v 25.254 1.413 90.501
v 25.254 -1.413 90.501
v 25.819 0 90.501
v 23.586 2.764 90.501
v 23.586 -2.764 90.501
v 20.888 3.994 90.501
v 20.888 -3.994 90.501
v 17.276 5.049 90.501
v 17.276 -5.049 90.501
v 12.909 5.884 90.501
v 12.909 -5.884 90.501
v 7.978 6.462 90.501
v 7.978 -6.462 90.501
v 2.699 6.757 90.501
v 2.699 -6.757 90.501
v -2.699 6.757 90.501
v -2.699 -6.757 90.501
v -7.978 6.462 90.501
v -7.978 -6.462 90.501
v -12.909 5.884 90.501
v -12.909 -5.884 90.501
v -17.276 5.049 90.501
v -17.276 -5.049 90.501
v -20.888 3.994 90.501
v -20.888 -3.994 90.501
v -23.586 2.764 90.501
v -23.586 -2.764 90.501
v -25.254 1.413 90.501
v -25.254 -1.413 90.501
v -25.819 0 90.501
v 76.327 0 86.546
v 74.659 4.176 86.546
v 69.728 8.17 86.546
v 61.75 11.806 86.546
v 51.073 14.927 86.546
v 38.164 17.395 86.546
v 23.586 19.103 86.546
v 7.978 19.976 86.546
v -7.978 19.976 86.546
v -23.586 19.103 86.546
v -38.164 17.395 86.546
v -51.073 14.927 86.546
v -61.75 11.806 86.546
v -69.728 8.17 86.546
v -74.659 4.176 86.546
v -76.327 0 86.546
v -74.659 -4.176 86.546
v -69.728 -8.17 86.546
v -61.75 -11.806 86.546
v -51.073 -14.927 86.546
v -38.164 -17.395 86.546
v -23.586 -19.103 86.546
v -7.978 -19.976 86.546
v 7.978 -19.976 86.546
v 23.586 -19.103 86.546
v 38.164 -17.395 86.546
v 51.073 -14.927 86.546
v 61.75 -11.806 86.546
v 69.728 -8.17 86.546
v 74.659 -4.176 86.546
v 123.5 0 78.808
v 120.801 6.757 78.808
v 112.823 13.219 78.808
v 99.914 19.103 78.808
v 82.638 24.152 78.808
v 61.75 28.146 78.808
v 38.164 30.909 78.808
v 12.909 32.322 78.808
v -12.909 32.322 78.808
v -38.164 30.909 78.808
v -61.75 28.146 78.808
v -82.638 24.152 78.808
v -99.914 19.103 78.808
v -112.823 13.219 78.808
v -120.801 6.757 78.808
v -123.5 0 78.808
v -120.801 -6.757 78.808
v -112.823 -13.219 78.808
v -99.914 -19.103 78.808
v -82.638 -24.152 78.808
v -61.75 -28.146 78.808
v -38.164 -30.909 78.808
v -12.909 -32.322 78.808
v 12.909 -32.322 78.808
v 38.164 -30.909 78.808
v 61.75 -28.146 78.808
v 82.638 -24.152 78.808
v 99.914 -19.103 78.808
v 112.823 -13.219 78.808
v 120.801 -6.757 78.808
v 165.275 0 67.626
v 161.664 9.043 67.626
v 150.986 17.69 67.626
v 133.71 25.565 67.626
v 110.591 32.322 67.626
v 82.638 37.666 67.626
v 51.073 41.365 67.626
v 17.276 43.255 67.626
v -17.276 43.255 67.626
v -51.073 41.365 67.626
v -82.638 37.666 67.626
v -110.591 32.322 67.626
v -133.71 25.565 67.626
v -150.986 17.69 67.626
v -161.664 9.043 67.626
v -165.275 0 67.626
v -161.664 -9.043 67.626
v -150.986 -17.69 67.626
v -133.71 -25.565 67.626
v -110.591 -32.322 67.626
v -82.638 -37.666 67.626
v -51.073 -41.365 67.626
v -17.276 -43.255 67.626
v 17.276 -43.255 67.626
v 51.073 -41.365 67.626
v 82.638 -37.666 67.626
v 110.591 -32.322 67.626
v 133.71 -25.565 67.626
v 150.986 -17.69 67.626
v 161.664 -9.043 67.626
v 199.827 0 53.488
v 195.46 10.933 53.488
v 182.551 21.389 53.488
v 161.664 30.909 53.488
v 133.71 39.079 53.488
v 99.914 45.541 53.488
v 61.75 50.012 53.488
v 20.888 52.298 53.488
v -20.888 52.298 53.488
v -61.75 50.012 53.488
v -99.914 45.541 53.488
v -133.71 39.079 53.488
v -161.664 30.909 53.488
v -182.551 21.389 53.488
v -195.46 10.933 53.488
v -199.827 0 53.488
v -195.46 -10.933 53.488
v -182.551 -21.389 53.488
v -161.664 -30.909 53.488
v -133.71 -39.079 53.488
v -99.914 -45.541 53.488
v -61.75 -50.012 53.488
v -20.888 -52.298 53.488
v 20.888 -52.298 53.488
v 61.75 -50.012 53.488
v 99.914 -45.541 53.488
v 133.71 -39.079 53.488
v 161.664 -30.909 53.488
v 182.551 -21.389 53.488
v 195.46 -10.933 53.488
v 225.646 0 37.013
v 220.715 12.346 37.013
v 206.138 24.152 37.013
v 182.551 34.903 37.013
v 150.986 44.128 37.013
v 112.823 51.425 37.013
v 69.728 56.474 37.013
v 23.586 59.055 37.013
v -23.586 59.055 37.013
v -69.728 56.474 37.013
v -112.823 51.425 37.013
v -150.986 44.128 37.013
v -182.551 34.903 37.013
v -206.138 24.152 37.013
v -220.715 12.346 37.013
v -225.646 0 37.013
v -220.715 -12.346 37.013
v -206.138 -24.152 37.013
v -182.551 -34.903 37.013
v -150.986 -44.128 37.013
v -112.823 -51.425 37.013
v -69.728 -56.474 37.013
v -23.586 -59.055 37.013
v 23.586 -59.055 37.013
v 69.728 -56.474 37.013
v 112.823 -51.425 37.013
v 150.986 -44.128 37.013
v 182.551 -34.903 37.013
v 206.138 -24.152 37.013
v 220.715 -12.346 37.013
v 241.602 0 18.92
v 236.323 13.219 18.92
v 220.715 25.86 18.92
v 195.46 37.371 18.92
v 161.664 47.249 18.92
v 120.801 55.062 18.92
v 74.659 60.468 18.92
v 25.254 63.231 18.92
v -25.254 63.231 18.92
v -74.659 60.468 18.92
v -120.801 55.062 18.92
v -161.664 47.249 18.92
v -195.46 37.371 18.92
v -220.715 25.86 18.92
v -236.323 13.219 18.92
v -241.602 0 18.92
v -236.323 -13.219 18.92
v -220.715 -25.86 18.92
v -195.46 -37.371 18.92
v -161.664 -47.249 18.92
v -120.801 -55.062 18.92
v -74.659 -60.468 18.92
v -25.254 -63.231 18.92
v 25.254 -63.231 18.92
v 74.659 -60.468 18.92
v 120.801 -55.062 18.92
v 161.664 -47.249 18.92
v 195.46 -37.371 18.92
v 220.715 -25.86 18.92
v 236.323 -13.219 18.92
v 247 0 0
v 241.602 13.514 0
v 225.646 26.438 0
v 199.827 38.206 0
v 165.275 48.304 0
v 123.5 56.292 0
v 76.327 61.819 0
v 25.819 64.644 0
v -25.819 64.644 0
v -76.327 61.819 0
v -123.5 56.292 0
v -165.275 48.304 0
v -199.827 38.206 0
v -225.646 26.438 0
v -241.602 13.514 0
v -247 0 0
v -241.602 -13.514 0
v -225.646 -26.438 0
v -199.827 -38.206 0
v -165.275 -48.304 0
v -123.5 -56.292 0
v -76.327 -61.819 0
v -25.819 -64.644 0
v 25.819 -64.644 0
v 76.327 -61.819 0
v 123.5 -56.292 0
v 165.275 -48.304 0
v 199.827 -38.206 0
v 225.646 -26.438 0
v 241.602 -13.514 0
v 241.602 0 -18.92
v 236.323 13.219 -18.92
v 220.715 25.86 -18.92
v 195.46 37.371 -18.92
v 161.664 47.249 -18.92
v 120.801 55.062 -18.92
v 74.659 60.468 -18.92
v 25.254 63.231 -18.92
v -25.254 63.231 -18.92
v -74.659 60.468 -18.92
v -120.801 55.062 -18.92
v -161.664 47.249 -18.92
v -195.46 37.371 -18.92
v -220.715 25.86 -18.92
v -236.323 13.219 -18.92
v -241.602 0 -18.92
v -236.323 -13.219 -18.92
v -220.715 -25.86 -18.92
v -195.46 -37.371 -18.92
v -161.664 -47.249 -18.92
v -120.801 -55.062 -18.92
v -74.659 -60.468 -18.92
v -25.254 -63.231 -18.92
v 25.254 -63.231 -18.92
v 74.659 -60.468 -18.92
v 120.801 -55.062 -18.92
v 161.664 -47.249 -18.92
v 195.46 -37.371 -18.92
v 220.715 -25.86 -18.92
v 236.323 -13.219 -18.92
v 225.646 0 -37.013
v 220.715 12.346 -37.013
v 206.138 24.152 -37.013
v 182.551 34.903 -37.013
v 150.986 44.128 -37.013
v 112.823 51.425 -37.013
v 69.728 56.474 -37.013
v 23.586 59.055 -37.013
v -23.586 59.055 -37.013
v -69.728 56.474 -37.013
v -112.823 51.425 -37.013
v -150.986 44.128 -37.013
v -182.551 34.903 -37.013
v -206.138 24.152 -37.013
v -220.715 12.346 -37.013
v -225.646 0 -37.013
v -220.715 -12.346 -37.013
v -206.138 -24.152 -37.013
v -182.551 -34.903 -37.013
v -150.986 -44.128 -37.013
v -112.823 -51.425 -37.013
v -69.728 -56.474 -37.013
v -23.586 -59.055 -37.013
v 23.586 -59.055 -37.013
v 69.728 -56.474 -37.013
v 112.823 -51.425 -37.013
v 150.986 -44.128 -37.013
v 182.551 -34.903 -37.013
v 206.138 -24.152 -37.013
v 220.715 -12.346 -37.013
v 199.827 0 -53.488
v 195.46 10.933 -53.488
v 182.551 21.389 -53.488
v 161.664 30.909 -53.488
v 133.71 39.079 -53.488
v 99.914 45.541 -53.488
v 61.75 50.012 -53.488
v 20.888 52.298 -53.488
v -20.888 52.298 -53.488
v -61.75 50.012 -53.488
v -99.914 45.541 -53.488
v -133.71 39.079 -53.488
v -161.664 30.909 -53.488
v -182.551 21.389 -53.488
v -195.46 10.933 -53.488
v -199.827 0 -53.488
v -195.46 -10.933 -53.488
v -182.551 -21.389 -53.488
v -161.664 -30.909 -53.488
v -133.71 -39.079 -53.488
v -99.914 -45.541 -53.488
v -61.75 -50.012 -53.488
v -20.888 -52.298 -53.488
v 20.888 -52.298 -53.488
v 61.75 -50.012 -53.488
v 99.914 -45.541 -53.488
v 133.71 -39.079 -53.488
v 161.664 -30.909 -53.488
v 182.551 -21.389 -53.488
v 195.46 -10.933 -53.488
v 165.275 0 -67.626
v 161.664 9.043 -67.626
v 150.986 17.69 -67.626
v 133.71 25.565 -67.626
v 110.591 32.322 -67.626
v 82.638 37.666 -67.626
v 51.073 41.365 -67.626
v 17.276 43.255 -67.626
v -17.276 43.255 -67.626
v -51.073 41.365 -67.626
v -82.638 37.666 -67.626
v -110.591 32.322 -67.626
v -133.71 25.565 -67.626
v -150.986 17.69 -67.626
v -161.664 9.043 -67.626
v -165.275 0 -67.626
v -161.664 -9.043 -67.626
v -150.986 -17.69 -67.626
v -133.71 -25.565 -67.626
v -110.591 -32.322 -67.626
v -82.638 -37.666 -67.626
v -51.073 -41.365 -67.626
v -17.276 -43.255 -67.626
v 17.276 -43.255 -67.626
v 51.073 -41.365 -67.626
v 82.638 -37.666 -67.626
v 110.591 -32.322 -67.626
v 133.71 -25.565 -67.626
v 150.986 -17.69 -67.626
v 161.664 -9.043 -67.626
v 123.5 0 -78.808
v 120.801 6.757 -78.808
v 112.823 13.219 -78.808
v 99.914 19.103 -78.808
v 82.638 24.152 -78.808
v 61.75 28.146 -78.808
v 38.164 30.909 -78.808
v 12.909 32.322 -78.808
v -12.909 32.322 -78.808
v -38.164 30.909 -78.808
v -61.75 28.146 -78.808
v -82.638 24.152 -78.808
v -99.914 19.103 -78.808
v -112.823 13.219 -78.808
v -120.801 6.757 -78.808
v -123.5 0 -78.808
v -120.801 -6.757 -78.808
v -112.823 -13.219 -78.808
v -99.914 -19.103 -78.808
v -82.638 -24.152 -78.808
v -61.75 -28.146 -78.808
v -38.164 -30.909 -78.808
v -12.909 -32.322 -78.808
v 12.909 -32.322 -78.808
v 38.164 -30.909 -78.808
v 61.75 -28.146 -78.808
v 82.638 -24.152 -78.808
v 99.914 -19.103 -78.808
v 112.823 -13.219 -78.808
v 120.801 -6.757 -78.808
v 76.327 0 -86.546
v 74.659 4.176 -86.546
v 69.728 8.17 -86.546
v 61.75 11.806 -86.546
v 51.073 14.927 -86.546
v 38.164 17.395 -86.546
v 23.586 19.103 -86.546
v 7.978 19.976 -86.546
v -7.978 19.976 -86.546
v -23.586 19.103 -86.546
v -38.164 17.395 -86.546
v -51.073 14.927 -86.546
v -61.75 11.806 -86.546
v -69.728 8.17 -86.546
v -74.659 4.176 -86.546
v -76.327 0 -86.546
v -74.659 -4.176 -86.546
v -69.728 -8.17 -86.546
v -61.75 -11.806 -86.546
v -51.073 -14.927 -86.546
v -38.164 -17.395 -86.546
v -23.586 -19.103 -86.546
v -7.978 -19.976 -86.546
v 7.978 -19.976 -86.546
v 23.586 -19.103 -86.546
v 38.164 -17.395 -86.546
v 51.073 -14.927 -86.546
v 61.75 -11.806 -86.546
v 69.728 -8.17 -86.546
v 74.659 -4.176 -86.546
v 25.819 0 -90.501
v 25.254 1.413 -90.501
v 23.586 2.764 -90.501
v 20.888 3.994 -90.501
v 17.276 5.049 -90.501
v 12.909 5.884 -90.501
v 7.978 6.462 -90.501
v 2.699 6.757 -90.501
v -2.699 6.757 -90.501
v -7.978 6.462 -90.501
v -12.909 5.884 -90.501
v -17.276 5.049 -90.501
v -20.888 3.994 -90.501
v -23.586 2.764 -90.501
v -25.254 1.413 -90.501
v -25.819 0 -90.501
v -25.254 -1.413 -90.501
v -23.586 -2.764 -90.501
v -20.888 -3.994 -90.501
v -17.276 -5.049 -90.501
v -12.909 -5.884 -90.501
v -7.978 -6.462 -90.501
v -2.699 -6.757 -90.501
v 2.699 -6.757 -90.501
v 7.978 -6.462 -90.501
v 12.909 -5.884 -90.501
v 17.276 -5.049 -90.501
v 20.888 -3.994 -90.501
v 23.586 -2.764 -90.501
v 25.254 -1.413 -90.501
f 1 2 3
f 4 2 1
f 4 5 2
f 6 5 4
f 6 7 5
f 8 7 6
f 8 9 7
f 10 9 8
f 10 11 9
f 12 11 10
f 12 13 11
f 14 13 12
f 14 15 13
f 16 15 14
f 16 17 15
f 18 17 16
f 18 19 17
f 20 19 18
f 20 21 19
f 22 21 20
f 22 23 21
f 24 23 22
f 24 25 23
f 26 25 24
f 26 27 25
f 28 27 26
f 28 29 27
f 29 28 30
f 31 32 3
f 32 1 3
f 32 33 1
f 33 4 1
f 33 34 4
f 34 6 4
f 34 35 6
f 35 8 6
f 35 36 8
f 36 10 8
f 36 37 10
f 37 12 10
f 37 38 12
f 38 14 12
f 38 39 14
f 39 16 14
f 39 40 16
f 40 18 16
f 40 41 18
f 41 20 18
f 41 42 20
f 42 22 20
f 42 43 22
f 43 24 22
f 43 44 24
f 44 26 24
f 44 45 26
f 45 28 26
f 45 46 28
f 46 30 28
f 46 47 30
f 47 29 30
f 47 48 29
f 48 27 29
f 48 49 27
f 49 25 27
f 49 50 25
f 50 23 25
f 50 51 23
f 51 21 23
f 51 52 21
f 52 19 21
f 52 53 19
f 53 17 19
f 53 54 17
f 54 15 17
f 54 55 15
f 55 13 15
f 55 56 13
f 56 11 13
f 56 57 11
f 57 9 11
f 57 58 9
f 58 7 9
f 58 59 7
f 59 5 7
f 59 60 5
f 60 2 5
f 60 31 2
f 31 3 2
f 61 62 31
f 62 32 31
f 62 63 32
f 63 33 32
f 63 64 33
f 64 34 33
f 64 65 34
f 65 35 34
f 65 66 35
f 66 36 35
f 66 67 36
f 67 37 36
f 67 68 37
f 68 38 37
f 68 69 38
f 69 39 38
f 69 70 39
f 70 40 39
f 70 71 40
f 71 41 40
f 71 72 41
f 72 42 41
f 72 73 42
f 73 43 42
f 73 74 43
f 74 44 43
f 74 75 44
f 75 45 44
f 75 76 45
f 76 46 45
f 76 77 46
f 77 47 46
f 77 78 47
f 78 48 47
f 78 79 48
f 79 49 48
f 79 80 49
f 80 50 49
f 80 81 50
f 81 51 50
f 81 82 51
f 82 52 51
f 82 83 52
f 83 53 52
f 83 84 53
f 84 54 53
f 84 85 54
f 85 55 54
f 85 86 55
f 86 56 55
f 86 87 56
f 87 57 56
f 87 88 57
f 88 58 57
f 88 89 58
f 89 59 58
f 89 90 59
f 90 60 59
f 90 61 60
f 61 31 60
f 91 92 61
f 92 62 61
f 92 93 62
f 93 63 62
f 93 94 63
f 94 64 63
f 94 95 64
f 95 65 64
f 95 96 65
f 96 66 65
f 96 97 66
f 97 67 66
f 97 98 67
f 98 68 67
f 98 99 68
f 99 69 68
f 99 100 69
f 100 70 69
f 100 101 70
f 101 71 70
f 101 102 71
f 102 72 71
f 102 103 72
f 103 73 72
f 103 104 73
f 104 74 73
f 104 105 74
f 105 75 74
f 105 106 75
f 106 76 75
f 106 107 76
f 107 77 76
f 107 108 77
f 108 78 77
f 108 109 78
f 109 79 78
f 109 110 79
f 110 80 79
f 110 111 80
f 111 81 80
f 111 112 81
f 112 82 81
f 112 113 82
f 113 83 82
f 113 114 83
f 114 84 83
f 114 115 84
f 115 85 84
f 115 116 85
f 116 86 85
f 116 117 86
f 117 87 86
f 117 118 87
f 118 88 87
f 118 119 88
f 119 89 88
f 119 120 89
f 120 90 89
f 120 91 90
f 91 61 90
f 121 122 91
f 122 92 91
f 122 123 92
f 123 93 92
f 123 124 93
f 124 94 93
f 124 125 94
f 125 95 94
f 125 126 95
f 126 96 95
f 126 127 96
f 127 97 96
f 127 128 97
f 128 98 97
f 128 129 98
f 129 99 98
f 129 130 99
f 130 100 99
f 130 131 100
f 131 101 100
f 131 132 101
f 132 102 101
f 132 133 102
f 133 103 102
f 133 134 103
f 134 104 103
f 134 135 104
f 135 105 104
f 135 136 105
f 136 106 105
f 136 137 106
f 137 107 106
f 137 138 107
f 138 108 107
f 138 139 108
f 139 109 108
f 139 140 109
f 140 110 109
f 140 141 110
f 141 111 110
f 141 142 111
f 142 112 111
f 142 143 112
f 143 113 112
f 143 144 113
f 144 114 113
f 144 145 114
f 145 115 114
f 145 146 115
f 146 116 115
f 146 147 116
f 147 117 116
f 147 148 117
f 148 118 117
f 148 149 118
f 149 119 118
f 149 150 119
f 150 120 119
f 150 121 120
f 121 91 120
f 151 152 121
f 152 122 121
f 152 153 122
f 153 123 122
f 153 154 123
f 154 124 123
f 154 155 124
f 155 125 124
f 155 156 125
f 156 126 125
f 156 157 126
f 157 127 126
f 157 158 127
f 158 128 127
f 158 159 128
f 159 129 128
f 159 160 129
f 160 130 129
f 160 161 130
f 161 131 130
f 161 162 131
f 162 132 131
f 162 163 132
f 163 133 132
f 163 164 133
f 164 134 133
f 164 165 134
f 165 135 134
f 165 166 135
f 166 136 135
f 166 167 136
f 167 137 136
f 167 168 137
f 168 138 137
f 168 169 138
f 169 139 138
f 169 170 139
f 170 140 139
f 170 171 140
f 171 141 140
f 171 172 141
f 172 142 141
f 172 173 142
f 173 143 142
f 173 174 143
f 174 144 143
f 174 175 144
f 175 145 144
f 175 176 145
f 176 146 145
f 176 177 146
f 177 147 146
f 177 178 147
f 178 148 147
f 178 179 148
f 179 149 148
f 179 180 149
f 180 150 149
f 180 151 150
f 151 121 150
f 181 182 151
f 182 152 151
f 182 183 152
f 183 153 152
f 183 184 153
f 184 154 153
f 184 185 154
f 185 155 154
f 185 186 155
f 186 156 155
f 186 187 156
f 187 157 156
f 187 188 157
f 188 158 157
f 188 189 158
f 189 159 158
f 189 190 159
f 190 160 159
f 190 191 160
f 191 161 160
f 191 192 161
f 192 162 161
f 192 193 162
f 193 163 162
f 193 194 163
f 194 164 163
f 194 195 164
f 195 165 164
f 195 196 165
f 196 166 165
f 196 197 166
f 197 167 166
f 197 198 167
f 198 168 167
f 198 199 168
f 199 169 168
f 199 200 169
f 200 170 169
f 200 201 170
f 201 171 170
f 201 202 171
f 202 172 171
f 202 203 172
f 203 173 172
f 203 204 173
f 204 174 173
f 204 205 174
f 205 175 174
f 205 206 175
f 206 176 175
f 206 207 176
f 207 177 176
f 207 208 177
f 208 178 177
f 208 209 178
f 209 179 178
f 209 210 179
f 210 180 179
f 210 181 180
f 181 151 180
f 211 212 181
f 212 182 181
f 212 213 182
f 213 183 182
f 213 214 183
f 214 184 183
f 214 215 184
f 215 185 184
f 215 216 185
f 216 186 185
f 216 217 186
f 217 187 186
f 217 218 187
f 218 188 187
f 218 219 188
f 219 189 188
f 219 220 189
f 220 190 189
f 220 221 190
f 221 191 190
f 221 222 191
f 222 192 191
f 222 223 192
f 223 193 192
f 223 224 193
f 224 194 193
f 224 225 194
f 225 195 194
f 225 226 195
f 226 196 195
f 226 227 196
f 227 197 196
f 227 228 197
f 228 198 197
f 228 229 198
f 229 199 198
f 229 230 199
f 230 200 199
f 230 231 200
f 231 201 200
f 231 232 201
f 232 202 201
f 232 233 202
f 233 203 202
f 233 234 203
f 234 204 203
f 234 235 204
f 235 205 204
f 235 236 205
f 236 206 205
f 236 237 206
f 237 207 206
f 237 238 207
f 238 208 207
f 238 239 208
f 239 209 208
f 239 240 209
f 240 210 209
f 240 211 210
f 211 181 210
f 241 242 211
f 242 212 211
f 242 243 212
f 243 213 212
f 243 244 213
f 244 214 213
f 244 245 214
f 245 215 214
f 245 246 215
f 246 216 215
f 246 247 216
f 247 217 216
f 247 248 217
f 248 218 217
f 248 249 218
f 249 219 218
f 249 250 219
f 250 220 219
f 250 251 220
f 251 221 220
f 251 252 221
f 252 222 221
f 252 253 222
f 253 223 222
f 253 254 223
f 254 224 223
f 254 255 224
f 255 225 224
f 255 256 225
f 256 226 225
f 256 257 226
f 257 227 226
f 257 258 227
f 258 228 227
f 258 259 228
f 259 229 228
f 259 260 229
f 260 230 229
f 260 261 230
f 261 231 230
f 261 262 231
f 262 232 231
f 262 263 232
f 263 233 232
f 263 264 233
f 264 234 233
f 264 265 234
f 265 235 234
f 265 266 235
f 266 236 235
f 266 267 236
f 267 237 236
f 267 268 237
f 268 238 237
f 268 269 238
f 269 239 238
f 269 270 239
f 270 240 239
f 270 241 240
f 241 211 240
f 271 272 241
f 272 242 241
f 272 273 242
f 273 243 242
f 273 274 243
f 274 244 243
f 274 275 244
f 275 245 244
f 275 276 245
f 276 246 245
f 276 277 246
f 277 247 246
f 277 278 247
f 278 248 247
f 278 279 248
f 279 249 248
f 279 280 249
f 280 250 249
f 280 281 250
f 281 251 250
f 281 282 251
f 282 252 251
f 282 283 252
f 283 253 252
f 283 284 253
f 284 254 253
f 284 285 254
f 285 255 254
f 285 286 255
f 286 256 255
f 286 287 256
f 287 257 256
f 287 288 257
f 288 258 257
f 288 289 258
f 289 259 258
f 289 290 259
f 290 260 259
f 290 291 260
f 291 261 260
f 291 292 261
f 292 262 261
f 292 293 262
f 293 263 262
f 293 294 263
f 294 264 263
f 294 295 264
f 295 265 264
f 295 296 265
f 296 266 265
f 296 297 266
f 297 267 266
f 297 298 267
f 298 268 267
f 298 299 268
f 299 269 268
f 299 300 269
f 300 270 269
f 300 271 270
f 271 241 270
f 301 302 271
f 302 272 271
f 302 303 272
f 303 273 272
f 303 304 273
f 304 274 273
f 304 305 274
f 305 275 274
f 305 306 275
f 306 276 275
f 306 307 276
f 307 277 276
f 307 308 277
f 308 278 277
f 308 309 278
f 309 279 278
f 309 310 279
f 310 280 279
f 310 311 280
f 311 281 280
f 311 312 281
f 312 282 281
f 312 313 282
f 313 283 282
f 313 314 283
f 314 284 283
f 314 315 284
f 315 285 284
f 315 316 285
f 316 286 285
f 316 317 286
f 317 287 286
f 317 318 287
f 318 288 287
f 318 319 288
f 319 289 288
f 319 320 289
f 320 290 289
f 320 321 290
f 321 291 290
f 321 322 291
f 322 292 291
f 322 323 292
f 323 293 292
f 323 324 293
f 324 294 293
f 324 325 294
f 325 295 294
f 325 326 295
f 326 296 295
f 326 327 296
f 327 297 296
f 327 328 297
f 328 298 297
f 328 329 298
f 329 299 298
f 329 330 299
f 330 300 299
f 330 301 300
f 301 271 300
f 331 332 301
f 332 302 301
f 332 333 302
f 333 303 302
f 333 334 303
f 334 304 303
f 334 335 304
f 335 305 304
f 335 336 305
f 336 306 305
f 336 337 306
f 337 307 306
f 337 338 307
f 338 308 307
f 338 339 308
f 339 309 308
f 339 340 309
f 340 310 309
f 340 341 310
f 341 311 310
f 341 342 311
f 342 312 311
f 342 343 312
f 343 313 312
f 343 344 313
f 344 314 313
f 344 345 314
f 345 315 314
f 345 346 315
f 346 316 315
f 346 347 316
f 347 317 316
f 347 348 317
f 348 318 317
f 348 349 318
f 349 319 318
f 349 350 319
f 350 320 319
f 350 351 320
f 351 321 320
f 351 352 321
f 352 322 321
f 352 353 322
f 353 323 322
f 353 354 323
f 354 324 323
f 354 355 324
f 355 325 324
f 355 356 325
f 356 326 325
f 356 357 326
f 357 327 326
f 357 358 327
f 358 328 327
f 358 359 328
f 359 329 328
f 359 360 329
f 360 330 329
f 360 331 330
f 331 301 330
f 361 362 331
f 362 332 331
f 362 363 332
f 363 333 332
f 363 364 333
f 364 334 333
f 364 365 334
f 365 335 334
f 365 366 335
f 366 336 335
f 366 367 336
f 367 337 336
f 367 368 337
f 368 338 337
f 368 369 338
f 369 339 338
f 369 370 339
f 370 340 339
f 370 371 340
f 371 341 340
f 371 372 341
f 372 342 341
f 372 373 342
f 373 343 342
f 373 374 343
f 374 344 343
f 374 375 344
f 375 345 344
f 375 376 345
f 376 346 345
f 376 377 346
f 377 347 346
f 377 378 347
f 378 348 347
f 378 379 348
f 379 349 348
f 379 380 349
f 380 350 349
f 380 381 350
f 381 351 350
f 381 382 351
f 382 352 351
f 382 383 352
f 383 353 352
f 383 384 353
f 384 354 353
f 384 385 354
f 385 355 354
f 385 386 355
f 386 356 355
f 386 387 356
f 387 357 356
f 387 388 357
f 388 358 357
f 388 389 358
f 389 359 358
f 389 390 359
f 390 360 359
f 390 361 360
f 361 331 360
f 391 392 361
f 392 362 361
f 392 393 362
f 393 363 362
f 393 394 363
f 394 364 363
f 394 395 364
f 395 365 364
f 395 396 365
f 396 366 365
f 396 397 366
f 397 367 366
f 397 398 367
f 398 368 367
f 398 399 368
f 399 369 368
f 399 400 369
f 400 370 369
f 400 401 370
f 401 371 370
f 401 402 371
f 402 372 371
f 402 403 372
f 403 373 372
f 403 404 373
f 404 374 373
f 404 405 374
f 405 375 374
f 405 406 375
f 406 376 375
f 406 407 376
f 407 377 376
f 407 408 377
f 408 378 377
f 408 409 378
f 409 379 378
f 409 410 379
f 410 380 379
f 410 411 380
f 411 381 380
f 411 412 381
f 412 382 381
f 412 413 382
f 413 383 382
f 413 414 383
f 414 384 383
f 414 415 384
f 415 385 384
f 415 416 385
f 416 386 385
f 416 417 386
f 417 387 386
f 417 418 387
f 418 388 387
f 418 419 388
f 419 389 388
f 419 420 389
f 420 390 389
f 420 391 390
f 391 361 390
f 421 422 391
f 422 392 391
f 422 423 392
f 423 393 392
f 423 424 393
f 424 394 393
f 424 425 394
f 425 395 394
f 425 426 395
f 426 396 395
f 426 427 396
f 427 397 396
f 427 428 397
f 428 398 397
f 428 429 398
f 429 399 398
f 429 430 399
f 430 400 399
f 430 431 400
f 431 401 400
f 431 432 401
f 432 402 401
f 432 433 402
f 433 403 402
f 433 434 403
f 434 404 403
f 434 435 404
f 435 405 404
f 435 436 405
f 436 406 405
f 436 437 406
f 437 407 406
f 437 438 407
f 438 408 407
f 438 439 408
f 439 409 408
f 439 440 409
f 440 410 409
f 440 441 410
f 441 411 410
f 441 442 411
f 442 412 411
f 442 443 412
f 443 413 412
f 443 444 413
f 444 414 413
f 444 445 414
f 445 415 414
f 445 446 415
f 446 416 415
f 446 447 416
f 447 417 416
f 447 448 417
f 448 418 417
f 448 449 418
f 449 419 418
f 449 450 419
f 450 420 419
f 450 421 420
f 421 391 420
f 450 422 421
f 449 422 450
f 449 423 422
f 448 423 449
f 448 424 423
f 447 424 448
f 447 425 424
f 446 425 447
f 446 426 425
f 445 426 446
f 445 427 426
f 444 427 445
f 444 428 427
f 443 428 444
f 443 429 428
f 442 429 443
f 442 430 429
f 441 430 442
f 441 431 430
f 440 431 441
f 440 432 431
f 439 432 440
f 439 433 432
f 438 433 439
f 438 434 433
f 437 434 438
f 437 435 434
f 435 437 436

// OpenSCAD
// Generated by SolidPython 1.0.1 on 2020-07-29 00:46:53


scale(v = [19, 5, 7]) {
	sphere(r = 13);
}
/***********************************************
*********      SolidPython code:      **********
************************************************
 
# import packages: SolidPython
from solid import *
from solid.utils import *
from itertools import chain, combinations, permutations


class Resize:

    def __init__(self, scad_file):
        self.scad_file = scad_file
        #self.scad_file = import_scad(scad_file)
        # cone/cylinder param:
        self.r1 = 0
        self.r2 = 0
        self.h = 0
        # rectangular prism param:
        self.w = 0
        self.l = 0
        # ellipse param:
        self.r = 0

    # import OpenScad code (file name corresponds to shape)


    # classify shape + parameters
    def assign(self, param1, param2, param3):
        if self.scad_file == 'cone.scad':
            self.r1 = param1
            self.r2 = param2
            self.h = param3
        elif self.scad_file == 'cylinder.scad':
            self.r1 = param1
            self.r2 = param2
            self.h = param3
        elif self.scad_file == 'rectangularPrism.scad':
            self.h = param1
            self.l = param2
            self.w = param3
        else:
            self.r = param1
            self.h = param2

    # resize parameters
    def iterate(self):
        x = range(3, 20, 2)
        i = 1
        if self.scad_file == 'cone.scad':
            tempList = list(permutations(x, 2))
            for temp in tempList:
                param1 = temp[0]
                param2 = temp[1]
                filepath = 'produced_scad_files/' + 'cone' + str(param1) + '_' + str(param2) + '_' + '.scad'
                scad_render_to_file(cylinder(h=param1, r1=param2, r2=0), filepath)

        elif self.scad_file == 'cylinder.scad':
            tempList = list(permutations(x, 3))
            for temp in tempList:
                param1 = temp[0]
                param2 = temp[1]
                filepath = 'produced_scad_files/' + 'cylinder' + str(param1) + '_' + str(param2) + '_' + '.scad'
                scad_render_to_file(cylinder(h=param1, r1=param2, r2=param2), filepath)

        elif self.scad_file == 'rectangularPrism.scad':
            tempList = list(permutations(x, 3))
            for temp in tempList:
                param1 = temp[0]
                param2 = temp[1]
                param3 = temp[2]
                filepath = 'produced_scad_files/' + 'rectangularPrism' + str(param1) + '_' + str(param2) + '_' + str(
                    param3) + '.scad'
                scad_render_to_file(cube(size=(param1, param2, param3)), filepath)

        elif self.scad_file == 'ellipse.scad':
            tempList = list(permutations(x, 4))
            for temp in tempList:
                param1 = temp[0]
                param2 = temp[1]
                param3 = temp[2]
                param4 = temp[3]
                filepath = 'produced_scad_files/' + 'ellipse' + str(param1) + '_' + str(param2) + '_' + str(param3) + '_' + str(param4) + '.scad'
                scad_render_to_file(scale([param1, param2, param3])(sphere(r=param4)), filepath)

    def render_to_scadfile(self):
        scad_render_to_file(scad, 'example.scad') 
 
************************************************/
